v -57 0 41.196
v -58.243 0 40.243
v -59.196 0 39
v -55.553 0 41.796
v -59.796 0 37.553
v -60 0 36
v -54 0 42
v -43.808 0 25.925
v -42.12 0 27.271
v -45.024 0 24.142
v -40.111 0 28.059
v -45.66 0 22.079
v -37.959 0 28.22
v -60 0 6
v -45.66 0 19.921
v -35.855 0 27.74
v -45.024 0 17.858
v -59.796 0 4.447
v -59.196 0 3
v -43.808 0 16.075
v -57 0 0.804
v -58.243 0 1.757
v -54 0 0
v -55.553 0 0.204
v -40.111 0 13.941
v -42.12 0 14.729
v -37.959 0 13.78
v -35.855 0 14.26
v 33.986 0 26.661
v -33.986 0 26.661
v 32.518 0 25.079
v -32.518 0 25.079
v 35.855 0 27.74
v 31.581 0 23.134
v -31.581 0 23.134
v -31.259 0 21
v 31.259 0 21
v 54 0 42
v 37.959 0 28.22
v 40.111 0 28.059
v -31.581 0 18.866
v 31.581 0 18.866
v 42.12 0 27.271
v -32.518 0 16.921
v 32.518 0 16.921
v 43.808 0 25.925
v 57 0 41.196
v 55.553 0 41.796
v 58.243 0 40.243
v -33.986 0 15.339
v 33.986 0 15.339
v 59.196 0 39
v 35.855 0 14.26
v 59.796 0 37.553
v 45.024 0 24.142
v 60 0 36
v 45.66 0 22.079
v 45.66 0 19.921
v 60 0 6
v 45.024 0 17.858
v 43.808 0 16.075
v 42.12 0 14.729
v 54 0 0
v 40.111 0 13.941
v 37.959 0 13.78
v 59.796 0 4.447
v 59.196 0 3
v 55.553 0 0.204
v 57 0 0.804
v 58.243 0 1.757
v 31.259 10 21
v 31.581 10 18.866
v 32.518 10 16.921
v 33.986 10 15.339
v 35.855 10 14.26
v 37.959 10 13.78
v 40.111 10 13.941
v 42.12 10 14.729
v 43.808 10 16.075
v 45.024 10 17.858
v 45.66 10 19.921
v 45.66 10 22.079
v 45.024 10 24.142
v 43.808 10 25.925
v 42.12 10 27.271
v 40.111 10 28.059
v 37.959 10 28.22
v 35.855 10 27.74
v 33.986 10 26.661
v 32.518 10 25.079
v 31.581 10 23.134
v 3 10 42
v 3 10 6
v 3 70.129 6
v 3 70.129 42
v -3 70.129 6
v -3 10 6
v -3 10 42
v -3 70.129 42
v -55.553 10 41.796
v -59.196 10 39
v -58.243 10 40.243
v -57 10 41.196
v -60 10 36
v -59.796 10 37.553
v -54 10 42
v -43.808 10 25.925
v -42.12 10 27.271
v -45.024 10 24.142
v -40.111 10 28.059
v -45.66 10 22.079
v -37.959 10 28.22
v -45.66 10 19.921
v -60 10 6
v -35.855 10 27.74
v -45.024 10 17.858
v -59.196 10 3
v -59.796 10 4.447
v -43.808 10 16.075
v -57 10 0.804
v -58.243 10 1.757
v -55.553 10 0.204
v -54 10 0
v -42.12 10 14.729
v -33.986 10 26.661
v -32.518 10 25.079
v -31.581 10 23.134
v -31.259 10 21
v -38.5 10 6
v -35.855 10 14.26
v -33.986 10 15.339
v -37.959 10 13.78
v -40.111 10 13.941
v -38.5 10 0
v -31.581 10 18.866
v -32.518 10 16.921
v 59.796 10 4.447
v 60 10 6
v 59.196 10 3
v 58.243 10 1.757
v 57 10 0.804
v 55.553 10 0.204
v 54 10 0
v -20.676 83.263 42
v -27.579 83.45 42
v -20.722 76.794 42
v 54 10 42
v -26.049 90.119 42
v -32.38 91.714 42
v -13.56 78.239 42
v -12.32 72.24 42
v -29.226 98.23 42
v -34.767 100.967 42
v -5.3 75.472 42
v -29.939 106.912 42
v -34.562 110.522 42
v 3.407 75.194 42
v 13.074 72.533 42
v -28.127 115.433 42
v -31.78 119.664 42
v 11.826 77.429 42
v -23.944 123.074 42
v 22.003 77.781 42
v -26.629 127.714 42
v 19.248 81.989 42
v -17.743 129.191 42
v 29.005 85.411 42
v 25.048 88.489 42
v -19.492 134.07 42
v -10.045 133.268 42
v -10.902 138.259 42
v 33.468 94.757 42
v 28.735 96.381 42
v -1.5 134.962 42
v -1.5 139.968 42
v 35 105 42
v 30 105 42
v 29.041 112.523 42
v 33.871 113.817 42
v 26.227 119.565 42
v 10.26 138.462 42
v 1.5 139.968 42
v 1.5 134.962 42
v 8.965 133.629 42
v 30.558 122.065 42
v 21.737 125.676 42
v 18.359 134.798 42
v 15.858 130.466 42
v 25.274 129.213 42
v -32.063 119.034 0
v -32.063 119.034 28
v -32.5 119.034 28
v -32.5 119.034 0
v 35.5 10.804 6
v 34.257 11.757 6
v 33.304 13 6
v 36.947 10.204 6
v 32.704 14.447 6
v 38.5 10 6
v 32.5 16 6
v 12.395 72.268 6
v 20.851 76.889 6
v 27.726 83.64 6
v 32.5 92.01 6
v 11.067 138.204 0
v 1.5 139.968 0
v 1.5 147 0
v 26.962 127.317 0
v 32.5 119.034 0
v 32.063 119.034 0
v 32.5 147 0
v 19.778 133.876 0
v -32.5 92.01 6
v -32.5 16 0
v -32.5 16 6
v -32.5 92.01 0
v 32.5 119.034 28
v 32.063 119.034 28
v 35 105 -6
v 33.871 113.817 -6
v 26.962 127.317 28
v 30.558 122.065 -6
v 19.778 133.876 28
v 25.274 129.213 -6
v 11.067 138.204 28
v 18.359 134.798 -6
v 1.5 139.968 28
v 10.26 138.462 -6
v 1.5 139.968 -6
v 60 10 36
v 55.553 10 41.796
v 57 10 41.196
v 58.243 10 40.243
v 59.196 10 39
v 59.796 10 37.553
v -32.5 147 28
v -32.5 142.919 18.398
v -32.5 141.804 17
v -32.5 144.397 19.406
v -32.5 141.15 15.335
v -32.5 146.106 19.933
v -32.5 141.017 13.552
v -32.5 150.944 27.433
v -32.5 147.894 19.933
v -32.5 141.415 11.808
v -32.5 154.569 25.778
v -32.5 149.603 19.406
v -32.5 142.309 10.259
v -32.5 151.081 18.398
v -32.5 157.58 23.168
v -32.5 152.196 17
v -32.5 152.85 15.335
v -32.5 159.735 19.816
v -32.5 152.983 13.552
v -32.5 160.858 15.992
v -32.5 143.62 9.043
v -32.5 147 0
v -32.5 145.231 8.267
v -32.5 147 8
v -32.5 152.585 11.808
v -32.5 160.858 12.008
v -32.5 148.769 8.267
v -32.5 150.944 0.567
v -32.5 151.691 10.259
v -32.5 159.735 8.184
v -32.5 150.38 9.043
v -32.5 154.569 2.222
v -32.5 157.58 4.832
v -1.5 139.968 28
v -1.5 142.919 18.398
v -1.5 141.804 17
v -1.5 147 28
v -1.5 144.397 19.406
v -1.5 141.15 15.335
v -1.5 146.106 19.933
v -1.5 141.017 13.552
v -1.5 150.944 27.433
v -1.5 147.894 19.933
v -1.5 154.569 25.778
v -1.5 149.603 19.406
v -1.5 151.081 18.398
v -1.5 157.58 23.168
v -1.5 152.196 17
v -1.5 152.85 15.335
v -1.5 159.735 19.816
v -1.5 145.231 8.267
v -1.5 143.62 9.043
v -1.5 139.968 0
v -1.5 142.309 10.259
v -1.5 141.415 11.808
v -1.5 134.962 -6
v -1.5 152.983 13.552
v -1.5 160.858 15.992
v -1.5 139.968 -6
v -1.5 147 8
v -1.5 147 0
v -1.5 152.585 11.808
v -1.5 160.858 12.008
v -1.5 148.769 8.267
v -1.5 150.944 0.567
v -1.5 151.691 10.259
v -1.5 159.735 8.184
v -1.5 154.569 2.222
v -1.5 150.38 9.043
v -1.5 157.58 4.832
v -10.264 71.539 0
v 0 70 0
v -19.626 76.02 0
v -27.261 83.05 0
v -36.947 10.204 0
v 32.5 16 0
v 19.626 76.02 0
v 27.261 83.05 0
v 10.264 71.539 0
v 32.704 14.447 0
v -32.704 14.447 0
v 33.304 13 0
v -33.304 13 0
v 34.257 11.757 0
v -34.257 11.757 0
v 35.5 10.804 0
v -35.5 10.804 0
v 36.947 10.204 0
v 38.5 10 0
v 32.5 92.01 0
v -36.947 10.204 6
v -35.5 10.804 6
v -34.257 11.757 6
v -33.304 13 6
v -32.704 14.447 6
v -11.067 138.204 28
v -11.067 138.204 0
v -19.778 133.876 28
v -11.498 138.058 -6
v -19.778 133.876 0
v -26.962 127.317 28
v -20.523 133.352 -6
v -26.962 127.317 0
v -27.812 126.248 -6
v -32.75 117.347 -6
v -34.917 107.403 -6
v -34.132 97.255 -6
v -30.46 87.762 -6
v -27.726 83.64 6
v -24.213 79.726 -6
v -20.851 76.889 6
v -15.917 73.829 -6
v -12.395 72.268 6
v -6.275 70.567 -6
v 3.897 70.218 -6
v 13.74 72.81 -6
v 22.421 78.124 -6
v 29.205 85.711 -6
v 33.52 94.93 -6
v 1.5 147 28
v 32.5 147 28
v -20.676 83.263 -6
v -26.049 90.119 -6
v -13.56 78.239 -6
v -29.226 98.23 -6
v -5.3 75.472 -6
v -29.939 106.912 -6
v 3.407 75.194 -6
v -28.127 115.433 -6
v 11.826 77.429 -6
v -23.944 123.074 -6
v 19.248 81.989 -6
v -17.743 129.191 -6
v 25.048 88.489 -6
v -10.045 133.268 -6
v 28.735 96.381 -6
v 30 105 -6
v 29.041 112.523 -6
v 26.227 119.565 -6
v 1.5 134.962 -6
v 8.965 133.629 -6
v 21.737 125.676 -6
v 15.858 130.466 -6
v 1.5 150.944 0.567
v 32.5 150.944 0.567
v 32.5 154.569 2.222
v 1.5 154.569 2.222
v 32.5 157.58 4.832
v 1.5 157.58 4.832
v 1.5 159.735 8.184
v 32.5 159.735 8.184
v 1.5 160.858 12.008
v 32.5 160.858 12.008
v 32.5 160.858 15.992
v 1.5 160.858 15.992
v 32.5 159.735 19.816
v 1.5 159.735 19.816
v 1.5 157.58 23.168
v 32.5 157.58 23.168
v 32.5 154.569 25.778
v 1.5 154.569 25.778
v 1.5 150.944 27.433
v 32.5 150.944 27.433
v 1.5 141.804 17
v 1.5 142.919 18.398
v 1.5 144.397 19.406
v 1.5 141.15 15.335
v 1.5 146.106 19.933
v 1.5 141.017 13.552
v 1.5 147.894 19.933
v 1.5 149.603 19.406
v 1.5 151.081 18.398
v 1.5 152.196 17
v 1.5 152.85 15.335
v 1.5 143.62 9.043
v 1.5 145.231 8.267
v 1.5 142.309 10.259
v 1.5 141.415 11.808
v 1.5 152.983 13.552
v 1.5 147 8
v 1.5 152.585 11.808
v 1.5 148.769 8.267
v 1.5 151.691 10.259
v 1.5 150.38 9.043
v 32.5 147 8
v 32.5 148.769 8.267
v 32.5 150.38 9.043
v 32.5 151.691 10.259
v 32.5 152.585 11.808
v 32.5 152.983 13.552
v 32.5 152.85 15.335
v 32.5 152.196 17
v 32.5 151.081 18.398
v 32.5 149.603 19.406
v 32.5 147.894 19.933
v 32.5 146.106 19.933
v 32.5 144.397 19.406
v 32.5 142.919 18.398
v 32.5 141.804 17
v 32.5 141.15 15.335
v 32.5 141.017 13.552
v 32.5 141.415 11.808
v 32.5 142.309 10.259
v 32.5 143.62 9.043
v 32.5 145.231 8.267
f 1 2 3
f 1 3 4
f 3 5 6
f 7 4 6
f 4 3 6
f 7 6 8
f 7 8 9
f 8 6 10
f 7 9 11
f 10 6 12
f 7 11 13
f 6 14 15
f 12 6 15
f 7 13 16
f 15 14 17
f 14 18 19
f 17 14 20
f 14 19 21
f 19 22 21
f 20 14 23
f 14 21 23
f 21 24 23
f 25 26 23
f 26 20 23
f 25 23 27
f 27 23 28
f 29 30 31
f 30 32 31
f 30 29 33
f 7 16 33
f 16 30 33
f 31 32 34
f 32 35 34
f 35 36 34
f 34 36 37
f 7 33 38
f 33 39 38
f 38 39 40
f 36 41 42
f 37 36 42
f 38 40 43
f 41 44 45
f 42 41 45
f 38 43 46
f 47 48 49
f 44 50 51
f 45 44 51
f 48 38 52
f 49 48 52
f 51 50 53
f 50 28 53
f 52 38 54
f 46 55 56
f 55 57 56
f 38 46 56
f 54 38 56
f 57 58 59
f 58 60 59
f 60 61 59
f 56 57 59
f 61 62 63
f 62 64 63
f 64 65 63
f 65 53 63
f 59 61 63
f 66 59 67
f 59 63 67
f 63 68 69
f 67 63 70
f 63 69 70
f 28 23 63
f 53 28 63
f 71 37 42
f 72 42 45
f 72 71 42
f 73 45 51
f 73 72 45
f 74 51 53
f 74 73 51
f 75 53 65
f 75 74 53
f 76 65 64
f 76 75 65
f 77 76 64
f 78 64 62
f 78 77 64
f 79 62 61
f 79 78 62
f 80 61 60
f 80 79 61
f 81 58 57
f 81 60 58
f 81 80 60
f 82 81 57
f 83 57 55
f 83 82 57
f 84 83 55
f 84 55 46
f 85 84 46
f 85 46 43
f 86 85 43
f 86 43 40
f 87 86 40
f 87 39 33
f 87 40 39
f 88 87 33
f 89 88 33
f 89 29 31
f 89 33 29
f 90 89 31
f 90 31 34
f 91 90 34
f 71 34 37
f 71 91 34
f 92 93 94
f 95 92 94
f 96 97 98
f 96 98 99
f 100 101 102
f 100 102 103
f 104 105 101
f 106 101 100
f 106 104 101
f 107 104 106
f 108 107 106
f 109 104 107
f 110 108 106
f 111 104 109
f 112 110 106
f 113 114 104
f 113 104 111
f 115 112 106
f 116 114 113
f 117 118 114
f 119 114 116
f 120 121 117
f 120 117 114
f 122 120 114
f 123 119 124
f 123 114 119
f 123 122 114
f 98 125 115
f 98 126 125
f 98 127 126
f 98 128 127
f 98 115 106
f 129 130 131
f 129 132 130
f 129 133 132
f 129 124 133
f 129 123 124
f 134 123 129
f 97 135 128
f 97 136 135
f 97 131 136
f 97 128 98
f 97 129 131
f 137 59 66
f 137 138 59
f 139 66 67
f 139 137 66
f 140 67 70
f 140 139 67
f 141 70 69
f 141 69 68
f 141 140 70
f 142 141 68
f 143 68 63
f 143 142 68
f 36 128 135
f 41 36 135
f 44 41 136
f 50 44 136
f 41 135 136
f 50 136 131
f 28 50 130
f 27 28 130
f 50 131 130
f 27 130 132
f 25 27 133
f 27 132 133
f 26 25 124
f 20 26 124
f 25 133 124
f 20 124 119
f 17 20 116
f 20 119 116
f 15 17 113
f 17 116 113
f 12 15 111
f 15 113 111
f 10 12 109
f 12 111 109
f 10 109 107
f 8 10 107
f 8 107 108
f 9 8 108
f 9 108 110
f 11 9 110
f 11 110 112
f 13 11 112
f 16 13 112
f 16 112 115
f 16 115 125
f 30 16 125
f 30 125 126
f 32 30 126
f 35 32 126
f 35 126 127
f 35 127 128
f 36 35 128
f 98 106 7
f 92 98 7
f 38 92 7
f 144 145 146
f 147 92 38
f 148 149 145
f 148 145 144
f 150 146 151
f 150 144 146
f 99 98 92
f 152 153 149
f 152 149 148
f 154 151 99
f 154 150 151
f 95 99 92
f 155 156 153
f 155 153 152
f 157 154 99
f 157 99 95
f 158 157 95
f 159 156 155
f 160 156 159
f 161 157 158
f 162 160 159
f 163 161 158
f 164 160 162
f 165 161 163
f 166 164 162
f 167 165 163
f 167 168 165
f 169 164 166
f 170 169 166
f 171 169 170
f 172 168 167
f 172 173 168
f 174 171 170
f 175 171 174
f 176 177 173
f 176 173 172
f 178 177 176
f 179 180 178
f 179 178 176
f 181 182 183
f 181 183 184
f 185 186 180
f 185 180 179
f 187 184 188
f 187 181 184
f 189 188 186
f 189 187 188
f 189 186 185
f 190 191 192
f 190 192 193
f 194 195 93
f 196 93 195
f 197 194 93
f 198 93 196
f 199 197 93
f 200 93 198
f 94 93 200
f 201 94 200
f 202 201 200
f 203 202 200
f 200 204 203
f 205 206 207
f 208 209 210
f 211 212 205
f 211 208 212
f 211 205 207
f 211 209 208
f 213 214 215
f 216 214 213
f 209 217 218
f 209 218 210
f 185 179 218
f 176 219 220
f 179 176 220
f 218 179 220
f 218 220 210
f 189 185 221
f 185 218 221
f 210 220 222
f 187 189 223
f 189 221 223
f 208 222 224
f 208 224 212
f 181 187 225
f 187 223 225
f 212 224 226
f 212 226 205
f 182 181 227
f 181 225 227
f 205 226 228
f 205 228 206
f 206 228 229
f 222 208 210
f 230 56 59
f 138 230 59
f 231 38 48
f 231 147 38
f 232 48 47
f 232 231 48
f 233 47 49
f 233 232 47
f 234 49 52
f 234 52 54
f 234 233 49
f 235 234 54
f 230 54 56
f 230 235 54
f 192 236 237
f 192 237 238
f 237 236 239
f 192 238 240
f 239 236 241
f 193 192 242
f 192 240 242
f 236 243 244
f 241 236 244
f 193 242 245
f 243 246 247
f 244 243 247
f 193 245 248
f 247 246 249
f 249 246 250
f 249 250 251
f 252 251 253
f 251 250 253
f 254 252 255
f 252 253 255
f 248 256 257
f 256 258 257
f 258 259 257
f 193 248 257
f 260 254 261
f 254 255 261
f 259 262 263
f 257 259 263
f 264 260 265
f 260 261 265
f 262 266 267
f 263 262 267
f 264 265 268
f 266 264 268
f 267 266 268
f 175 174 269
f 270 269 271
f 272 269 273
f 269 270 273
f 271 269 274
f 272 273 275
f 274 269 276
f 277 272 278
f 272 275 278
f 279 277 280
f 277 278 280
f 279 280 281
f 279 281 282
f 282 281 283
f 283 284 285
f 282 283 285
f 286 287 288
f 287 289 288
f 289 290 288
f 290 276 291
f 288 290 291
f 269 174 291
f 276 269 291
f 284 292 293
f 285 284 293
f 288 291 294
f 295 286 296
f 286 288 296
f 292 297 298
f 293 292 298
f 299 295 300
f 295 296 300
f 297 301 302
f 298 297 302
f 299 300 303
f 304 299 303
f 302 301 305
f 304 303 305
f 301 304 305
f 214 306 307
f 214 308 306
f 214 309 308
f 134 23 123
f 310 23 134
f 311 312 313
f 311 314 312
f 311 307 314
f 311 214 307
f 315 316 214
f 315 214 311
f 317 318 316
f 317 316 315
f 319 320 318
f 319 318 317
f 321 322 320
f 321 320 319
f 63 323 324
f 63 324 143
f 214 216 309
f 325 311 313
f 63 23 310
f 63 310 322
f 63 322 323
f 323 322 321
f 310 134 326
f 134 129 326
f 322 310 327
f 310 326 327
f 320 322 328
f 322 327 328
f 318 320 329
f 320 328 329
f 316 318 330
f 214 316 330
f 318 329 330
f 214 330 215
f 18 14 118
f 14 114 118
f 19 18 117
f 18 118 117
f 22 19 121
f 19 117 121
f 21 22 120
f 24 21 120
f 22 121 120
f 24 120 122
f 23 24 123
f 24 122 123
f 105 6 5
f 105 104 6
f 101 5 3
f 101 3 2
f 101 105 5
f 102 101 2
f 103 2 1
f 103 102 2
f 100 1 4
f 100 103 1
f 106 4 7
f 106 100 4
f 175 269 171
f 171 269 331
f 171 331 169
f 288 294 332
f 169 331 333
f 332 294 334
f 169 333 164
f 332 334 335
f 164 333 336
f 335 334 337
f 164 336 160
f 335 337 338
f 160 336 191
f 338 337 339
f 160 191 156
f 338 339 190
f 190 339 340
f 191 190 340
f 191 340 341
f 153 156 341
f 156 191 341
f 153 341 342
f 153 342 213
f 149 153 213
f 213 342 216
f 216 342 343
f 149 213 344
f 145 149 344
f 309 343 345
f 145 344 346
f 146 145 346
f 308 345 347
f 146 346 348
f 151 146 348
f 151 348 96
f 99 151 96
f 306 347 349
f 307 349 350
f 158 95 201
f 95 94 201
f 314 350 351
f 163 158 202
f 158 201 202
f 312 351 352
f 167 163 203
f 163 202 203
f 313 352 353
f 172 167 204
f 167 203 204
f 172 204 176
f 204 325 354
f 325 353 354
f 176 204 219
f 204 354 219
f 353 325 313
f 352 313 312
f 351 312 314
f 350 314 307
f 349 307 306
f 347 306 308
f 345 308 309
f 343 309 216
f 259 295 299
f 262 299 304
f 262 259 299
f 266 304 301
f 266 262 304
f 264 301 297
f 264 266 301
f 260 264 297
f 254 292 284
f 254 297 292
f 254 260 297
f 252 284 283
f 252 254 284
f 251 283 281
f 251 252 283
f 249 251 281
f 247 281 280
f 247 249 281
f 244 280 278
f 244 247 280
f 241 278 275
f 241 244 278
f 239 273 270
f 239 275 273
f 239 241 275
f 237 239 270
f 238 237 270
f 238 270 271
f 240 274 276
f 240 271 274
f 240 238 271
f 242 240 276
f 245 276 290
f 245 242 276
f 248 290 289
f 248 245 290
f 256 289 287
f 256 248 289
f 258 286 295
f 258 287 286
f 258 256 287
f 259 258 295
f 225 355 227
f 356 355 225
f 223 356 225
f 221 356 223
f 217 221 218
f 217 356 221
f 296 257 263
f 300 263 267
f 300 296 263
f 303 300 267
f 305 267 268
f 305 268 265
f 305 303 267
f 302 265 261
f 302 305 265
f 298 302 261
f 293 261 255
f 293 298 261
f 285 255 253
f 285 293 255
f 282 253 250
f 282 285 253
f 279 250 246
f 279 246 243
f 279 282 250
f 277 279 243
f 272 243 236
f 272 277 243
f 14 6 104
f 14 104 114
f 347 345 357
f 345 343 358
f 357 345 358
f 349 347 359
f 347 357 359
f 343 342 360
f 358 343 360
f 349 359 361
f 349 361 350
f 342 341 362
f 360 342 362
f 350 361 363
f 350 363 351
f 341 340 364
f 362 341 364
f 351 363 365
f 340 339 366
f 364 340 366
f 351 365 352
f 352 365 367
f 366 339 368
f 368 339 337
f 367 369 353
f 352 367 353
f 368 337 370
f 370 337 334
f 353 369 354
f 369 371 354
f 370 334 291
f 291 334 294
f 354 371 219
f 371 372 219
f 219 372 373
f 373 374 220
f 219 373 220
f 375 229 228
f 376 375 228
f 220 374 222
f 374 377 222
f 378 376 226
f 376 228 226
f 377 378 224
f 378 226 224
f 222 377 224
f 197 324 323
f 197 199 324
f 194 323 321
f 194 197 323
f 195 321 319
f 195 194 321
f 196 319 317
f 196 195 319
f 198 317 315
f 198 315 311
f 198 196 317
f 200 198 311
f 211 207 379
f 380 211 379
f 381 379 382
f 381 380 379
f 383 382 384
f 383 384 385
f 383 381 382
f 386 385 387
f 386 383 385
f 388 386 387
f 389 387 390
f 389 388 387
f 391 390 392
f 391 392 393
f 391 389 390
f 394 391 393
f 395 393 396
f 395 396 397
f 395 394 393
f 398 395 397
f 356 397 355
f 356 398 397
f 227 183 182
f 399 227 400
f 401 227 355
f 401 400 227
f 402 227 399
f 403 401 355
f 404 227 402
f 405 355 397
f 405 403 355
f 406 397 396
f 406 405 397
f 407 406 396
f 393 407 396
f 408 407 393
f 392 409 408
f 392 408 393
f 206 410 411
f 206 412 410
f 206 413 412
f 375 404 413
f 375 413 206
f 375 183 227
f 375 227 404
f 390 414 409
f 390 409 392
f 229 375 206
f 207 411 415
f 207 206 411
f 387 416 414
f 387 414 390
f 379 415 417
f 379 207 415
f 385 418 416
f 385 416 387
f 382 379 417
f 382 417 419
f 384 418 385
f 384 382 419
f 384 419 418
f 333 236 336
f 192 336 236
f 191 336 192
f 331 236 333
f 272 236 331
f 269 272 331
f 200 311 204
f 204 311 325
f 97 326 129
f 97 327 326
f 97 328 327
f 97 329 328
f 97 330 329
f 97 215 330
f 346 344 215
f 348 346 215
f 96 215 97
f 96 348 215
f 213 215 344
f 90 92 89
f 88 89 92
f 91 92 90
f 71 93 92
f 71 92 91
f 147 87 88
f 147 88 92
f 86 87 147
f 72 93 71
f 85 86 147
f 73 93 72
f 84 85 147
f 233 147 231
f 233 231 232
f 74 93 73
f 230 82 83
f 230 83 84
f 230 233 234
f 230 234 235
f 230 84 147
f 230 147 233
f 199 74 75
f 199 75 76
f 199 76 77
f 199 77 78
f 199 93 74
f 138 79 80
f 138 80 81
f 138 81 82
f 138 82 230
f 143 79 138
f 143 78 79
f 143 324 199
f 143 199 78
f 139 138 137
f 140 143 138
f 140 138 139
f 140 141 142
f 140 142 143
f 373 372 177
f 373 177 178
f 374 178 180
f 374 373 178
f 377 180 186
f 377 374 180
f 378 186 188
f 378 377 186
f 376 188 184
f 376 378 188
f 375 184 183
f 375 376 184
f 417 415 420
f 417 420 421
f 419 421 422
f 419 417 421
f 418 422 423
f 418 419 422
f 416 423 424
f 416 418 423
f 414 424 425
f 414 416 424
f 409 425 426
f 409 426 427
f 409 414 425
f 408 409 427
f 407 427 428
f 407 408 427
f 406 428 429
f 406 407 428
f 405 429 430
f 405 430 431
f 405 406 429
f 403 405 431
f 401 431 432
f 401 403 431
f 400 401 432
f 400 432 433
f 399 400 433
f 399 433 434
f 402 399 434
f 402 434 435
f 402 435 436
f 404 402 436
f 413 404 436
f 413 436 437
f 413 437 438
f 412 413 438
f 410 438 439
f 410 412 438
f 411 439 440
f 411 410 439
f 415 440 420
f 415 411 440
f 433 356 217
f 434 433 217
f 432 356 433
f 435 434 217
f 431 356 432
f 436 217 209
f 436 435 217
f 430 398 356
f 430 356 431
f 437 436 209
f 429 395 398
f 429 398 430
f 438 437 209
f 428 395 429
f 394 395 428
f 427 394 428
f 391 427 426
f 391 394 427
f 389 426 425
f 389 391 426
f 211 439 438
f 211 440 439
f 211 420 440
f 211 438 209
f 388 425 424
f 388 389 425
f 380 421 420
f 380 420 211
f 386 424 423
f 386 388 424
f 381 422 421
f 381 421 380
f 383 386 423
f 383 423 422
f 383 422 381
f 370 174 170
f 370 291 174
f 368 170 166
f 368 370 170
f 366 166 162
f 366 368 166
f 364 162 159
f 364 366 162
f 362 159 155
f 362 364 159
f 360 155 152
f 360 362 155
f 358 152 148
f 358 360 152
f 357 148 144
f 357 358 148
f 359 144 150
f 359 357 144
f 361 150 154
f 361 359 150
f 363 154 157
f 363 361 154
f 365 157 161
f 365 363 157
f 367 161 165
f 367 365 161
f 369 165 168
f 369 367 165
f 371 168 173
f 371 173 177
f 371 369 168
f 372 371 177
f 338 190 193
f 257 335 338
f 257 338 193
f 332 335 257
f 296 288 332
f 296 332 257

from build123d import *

# Parameters (mm, degrees)
CROQUIS2_W              = 120
CROQUIS2_H              = 42
SALIENTE_EXTRUIR1_DEPTH = 10
REDONDEO1_R             = 6
CROQUIS3_W              = 65
CROQUIS3_H              = 95
SALIENTE_EXTRUIR2_DEPTH = 6
REDONDEO2_R             = 6
CROQUIS4_R              = 7.240565909
CORTAR_EXTRUIR1_DEPTH   = 11
CROQUIS6_R              = 35
CROQUIS6_R_2            = 30
EXTRUIR_L_MINA1_DEPTH   = 48
CROQUIS8_W              = 6
CROQUIS8_H              = 60.128808452
SALIENTE_EXTRUIR3_DEPTH = 36
CROQUIS9_R              = 6
SALIENTE_EXTRUIR4_DEPTH = 32.5
CROQUIS10_R             = 30
CORTAR_EXTRUIR3_DEPTH   = 49
CROQUIS11_W             = 3
CROQUIS11_H             = 67.611732644
CORTAR_EXTRUIR4_DEPTH   = 49


with BuildPart() as part:
    # Croquis2 → Saliente-Extruir1 (new body)
    with BuildSketch(Plane(origin=(0, 0, 0), x_dir=(1, 0, 0), z_dir=(0, 1, 0))):
        with Locations((0, -21)):
            Rectangle(CROQUIS2_W, CROQUIS2_H)
    extrude(amount=SALIENTE_EXTRUIR1_DEPTH)

    # Redondeo1
    redondeo1_edges = [part.edges().sort_by_distance(p)[0] for p in [
        (60, 5, 42),
        (-60, 5, 42),
        (-60, 5, 0),
        (60, 5, 0),
    ]]
    fillet(redondeo1_edges, radius=REDONDEO1_R)

    # Croquis3 → Saliente-Extruir2 (add)
    with BuildSketch(Plane.XY):
        with Locations((0, 57.5)):
            Rectangle(CROQUIS3_W, CROQUIS3_H)
    extrude(amount=SALIENTE_EXTRUIR2_DEPTH)

    # Redondeo2
    redondeo2_edges = [part.edges().sort_by_distance(p)[0] for p in [
        (32.5, 10, 3),
        (-32.5, 10, 3),
    ]]
    fillet(redondeo2_edges, radius=REDONDEO2_R)

    # Croquis4 → Cortar-Extruir1 (cut, through all)
    with BuildSketch(Plane(origin=(0, 10, 0), x_dir=(1, 0, 0), z_dir=(0, 1, 0))):
        with Locations((-38.5, -21)):
            Circle(CROQUIS4_R)
    cortar_extruir1 = extrude(amount=-CORTAR_EXTRUIR1_DEPTH, mode=Mode.SUBTRACT)

    # Simetría1: Cortar-Extruir1 across plane
    add(cortar_extruir1.mirror(Plane(origin=(0, 0, 0), x_dir=(0, 0, 1), z_dir=(1, 0, 0))), mode=Mode.SUBTRACT)

    # Croquis6 → Extruir-Lámina1 (add)
    with BuildSketch(Plane.XY.offset(-6)):
        with Locations((0, 105)):
            Circle(CROQUIS6_R)
        with Locations((0, 105)):
            Circle(CROQUIS6_R_2, mode=Mode.SUBTRACT)
    extrude(amount=EXTRUIR_L_MINA1_DEPTH)

    # Croquis8 → Saliente-Extruir3 (add)
    with BuildSketch(Plane.XY.offset(6)):
        with Locations((0, 40.064404226)):
            Rectangle(CROQUIS8_W, CROQUIS8_H)
    extrude(amount=SALIENTE_EXTRUIR3_DEPTH)

    # Croquis9 → Saliente-Extruir4 (add, symmetric)
    with BuildSketch(Plane(origin=(0, 0, 0), x_dir=(0, 0, -1), z_dir=(1, 0, 0))):
        with BuildLine():
            Line((0, 126.068220277), (0, 147))
            ThreePointArc((0, 147), (-14, 161), (-28, 147))
            Line((-28, 147), (-28, 119.03405794))
            Line((-28, 119.03405794), (0, 119.03405794))
            Line((0, 119.03405794), (0, 126.068220277))
        make_face()
        with Locations((-14, 147)):
            Circle(CROQUIS9_R, mode=Mode.SUBTRACT)
    extrude(amount=SALIENTE_EXTRUIR4_DEPTH, both=True)

    # Croquis10 → Cortar-Extruir3 (cut, through all)
    with BuildSketch(Plane.XY.offset(-6)):
        with Locations((0, 105)):
            Circle(CROQUIS10_R)
    extrude(amount=CORTAR_EXTRUIR3_DEPTH, mode=Mode.SUBTRACT)

    # Croquis11 → Cortar-Extruir4 (cut, through all)
    with BuildSketch(Plane.XY.offset(-6)):
        with Locations((0, 138.805866322)):
            Rectangle(CROQUIS11_W, CROQUIS11_H)
    extrude(amount=CORTAR_EXTRUIR4_DEPTH, mode=Mode.SUBTRACT)


solid = part.part
